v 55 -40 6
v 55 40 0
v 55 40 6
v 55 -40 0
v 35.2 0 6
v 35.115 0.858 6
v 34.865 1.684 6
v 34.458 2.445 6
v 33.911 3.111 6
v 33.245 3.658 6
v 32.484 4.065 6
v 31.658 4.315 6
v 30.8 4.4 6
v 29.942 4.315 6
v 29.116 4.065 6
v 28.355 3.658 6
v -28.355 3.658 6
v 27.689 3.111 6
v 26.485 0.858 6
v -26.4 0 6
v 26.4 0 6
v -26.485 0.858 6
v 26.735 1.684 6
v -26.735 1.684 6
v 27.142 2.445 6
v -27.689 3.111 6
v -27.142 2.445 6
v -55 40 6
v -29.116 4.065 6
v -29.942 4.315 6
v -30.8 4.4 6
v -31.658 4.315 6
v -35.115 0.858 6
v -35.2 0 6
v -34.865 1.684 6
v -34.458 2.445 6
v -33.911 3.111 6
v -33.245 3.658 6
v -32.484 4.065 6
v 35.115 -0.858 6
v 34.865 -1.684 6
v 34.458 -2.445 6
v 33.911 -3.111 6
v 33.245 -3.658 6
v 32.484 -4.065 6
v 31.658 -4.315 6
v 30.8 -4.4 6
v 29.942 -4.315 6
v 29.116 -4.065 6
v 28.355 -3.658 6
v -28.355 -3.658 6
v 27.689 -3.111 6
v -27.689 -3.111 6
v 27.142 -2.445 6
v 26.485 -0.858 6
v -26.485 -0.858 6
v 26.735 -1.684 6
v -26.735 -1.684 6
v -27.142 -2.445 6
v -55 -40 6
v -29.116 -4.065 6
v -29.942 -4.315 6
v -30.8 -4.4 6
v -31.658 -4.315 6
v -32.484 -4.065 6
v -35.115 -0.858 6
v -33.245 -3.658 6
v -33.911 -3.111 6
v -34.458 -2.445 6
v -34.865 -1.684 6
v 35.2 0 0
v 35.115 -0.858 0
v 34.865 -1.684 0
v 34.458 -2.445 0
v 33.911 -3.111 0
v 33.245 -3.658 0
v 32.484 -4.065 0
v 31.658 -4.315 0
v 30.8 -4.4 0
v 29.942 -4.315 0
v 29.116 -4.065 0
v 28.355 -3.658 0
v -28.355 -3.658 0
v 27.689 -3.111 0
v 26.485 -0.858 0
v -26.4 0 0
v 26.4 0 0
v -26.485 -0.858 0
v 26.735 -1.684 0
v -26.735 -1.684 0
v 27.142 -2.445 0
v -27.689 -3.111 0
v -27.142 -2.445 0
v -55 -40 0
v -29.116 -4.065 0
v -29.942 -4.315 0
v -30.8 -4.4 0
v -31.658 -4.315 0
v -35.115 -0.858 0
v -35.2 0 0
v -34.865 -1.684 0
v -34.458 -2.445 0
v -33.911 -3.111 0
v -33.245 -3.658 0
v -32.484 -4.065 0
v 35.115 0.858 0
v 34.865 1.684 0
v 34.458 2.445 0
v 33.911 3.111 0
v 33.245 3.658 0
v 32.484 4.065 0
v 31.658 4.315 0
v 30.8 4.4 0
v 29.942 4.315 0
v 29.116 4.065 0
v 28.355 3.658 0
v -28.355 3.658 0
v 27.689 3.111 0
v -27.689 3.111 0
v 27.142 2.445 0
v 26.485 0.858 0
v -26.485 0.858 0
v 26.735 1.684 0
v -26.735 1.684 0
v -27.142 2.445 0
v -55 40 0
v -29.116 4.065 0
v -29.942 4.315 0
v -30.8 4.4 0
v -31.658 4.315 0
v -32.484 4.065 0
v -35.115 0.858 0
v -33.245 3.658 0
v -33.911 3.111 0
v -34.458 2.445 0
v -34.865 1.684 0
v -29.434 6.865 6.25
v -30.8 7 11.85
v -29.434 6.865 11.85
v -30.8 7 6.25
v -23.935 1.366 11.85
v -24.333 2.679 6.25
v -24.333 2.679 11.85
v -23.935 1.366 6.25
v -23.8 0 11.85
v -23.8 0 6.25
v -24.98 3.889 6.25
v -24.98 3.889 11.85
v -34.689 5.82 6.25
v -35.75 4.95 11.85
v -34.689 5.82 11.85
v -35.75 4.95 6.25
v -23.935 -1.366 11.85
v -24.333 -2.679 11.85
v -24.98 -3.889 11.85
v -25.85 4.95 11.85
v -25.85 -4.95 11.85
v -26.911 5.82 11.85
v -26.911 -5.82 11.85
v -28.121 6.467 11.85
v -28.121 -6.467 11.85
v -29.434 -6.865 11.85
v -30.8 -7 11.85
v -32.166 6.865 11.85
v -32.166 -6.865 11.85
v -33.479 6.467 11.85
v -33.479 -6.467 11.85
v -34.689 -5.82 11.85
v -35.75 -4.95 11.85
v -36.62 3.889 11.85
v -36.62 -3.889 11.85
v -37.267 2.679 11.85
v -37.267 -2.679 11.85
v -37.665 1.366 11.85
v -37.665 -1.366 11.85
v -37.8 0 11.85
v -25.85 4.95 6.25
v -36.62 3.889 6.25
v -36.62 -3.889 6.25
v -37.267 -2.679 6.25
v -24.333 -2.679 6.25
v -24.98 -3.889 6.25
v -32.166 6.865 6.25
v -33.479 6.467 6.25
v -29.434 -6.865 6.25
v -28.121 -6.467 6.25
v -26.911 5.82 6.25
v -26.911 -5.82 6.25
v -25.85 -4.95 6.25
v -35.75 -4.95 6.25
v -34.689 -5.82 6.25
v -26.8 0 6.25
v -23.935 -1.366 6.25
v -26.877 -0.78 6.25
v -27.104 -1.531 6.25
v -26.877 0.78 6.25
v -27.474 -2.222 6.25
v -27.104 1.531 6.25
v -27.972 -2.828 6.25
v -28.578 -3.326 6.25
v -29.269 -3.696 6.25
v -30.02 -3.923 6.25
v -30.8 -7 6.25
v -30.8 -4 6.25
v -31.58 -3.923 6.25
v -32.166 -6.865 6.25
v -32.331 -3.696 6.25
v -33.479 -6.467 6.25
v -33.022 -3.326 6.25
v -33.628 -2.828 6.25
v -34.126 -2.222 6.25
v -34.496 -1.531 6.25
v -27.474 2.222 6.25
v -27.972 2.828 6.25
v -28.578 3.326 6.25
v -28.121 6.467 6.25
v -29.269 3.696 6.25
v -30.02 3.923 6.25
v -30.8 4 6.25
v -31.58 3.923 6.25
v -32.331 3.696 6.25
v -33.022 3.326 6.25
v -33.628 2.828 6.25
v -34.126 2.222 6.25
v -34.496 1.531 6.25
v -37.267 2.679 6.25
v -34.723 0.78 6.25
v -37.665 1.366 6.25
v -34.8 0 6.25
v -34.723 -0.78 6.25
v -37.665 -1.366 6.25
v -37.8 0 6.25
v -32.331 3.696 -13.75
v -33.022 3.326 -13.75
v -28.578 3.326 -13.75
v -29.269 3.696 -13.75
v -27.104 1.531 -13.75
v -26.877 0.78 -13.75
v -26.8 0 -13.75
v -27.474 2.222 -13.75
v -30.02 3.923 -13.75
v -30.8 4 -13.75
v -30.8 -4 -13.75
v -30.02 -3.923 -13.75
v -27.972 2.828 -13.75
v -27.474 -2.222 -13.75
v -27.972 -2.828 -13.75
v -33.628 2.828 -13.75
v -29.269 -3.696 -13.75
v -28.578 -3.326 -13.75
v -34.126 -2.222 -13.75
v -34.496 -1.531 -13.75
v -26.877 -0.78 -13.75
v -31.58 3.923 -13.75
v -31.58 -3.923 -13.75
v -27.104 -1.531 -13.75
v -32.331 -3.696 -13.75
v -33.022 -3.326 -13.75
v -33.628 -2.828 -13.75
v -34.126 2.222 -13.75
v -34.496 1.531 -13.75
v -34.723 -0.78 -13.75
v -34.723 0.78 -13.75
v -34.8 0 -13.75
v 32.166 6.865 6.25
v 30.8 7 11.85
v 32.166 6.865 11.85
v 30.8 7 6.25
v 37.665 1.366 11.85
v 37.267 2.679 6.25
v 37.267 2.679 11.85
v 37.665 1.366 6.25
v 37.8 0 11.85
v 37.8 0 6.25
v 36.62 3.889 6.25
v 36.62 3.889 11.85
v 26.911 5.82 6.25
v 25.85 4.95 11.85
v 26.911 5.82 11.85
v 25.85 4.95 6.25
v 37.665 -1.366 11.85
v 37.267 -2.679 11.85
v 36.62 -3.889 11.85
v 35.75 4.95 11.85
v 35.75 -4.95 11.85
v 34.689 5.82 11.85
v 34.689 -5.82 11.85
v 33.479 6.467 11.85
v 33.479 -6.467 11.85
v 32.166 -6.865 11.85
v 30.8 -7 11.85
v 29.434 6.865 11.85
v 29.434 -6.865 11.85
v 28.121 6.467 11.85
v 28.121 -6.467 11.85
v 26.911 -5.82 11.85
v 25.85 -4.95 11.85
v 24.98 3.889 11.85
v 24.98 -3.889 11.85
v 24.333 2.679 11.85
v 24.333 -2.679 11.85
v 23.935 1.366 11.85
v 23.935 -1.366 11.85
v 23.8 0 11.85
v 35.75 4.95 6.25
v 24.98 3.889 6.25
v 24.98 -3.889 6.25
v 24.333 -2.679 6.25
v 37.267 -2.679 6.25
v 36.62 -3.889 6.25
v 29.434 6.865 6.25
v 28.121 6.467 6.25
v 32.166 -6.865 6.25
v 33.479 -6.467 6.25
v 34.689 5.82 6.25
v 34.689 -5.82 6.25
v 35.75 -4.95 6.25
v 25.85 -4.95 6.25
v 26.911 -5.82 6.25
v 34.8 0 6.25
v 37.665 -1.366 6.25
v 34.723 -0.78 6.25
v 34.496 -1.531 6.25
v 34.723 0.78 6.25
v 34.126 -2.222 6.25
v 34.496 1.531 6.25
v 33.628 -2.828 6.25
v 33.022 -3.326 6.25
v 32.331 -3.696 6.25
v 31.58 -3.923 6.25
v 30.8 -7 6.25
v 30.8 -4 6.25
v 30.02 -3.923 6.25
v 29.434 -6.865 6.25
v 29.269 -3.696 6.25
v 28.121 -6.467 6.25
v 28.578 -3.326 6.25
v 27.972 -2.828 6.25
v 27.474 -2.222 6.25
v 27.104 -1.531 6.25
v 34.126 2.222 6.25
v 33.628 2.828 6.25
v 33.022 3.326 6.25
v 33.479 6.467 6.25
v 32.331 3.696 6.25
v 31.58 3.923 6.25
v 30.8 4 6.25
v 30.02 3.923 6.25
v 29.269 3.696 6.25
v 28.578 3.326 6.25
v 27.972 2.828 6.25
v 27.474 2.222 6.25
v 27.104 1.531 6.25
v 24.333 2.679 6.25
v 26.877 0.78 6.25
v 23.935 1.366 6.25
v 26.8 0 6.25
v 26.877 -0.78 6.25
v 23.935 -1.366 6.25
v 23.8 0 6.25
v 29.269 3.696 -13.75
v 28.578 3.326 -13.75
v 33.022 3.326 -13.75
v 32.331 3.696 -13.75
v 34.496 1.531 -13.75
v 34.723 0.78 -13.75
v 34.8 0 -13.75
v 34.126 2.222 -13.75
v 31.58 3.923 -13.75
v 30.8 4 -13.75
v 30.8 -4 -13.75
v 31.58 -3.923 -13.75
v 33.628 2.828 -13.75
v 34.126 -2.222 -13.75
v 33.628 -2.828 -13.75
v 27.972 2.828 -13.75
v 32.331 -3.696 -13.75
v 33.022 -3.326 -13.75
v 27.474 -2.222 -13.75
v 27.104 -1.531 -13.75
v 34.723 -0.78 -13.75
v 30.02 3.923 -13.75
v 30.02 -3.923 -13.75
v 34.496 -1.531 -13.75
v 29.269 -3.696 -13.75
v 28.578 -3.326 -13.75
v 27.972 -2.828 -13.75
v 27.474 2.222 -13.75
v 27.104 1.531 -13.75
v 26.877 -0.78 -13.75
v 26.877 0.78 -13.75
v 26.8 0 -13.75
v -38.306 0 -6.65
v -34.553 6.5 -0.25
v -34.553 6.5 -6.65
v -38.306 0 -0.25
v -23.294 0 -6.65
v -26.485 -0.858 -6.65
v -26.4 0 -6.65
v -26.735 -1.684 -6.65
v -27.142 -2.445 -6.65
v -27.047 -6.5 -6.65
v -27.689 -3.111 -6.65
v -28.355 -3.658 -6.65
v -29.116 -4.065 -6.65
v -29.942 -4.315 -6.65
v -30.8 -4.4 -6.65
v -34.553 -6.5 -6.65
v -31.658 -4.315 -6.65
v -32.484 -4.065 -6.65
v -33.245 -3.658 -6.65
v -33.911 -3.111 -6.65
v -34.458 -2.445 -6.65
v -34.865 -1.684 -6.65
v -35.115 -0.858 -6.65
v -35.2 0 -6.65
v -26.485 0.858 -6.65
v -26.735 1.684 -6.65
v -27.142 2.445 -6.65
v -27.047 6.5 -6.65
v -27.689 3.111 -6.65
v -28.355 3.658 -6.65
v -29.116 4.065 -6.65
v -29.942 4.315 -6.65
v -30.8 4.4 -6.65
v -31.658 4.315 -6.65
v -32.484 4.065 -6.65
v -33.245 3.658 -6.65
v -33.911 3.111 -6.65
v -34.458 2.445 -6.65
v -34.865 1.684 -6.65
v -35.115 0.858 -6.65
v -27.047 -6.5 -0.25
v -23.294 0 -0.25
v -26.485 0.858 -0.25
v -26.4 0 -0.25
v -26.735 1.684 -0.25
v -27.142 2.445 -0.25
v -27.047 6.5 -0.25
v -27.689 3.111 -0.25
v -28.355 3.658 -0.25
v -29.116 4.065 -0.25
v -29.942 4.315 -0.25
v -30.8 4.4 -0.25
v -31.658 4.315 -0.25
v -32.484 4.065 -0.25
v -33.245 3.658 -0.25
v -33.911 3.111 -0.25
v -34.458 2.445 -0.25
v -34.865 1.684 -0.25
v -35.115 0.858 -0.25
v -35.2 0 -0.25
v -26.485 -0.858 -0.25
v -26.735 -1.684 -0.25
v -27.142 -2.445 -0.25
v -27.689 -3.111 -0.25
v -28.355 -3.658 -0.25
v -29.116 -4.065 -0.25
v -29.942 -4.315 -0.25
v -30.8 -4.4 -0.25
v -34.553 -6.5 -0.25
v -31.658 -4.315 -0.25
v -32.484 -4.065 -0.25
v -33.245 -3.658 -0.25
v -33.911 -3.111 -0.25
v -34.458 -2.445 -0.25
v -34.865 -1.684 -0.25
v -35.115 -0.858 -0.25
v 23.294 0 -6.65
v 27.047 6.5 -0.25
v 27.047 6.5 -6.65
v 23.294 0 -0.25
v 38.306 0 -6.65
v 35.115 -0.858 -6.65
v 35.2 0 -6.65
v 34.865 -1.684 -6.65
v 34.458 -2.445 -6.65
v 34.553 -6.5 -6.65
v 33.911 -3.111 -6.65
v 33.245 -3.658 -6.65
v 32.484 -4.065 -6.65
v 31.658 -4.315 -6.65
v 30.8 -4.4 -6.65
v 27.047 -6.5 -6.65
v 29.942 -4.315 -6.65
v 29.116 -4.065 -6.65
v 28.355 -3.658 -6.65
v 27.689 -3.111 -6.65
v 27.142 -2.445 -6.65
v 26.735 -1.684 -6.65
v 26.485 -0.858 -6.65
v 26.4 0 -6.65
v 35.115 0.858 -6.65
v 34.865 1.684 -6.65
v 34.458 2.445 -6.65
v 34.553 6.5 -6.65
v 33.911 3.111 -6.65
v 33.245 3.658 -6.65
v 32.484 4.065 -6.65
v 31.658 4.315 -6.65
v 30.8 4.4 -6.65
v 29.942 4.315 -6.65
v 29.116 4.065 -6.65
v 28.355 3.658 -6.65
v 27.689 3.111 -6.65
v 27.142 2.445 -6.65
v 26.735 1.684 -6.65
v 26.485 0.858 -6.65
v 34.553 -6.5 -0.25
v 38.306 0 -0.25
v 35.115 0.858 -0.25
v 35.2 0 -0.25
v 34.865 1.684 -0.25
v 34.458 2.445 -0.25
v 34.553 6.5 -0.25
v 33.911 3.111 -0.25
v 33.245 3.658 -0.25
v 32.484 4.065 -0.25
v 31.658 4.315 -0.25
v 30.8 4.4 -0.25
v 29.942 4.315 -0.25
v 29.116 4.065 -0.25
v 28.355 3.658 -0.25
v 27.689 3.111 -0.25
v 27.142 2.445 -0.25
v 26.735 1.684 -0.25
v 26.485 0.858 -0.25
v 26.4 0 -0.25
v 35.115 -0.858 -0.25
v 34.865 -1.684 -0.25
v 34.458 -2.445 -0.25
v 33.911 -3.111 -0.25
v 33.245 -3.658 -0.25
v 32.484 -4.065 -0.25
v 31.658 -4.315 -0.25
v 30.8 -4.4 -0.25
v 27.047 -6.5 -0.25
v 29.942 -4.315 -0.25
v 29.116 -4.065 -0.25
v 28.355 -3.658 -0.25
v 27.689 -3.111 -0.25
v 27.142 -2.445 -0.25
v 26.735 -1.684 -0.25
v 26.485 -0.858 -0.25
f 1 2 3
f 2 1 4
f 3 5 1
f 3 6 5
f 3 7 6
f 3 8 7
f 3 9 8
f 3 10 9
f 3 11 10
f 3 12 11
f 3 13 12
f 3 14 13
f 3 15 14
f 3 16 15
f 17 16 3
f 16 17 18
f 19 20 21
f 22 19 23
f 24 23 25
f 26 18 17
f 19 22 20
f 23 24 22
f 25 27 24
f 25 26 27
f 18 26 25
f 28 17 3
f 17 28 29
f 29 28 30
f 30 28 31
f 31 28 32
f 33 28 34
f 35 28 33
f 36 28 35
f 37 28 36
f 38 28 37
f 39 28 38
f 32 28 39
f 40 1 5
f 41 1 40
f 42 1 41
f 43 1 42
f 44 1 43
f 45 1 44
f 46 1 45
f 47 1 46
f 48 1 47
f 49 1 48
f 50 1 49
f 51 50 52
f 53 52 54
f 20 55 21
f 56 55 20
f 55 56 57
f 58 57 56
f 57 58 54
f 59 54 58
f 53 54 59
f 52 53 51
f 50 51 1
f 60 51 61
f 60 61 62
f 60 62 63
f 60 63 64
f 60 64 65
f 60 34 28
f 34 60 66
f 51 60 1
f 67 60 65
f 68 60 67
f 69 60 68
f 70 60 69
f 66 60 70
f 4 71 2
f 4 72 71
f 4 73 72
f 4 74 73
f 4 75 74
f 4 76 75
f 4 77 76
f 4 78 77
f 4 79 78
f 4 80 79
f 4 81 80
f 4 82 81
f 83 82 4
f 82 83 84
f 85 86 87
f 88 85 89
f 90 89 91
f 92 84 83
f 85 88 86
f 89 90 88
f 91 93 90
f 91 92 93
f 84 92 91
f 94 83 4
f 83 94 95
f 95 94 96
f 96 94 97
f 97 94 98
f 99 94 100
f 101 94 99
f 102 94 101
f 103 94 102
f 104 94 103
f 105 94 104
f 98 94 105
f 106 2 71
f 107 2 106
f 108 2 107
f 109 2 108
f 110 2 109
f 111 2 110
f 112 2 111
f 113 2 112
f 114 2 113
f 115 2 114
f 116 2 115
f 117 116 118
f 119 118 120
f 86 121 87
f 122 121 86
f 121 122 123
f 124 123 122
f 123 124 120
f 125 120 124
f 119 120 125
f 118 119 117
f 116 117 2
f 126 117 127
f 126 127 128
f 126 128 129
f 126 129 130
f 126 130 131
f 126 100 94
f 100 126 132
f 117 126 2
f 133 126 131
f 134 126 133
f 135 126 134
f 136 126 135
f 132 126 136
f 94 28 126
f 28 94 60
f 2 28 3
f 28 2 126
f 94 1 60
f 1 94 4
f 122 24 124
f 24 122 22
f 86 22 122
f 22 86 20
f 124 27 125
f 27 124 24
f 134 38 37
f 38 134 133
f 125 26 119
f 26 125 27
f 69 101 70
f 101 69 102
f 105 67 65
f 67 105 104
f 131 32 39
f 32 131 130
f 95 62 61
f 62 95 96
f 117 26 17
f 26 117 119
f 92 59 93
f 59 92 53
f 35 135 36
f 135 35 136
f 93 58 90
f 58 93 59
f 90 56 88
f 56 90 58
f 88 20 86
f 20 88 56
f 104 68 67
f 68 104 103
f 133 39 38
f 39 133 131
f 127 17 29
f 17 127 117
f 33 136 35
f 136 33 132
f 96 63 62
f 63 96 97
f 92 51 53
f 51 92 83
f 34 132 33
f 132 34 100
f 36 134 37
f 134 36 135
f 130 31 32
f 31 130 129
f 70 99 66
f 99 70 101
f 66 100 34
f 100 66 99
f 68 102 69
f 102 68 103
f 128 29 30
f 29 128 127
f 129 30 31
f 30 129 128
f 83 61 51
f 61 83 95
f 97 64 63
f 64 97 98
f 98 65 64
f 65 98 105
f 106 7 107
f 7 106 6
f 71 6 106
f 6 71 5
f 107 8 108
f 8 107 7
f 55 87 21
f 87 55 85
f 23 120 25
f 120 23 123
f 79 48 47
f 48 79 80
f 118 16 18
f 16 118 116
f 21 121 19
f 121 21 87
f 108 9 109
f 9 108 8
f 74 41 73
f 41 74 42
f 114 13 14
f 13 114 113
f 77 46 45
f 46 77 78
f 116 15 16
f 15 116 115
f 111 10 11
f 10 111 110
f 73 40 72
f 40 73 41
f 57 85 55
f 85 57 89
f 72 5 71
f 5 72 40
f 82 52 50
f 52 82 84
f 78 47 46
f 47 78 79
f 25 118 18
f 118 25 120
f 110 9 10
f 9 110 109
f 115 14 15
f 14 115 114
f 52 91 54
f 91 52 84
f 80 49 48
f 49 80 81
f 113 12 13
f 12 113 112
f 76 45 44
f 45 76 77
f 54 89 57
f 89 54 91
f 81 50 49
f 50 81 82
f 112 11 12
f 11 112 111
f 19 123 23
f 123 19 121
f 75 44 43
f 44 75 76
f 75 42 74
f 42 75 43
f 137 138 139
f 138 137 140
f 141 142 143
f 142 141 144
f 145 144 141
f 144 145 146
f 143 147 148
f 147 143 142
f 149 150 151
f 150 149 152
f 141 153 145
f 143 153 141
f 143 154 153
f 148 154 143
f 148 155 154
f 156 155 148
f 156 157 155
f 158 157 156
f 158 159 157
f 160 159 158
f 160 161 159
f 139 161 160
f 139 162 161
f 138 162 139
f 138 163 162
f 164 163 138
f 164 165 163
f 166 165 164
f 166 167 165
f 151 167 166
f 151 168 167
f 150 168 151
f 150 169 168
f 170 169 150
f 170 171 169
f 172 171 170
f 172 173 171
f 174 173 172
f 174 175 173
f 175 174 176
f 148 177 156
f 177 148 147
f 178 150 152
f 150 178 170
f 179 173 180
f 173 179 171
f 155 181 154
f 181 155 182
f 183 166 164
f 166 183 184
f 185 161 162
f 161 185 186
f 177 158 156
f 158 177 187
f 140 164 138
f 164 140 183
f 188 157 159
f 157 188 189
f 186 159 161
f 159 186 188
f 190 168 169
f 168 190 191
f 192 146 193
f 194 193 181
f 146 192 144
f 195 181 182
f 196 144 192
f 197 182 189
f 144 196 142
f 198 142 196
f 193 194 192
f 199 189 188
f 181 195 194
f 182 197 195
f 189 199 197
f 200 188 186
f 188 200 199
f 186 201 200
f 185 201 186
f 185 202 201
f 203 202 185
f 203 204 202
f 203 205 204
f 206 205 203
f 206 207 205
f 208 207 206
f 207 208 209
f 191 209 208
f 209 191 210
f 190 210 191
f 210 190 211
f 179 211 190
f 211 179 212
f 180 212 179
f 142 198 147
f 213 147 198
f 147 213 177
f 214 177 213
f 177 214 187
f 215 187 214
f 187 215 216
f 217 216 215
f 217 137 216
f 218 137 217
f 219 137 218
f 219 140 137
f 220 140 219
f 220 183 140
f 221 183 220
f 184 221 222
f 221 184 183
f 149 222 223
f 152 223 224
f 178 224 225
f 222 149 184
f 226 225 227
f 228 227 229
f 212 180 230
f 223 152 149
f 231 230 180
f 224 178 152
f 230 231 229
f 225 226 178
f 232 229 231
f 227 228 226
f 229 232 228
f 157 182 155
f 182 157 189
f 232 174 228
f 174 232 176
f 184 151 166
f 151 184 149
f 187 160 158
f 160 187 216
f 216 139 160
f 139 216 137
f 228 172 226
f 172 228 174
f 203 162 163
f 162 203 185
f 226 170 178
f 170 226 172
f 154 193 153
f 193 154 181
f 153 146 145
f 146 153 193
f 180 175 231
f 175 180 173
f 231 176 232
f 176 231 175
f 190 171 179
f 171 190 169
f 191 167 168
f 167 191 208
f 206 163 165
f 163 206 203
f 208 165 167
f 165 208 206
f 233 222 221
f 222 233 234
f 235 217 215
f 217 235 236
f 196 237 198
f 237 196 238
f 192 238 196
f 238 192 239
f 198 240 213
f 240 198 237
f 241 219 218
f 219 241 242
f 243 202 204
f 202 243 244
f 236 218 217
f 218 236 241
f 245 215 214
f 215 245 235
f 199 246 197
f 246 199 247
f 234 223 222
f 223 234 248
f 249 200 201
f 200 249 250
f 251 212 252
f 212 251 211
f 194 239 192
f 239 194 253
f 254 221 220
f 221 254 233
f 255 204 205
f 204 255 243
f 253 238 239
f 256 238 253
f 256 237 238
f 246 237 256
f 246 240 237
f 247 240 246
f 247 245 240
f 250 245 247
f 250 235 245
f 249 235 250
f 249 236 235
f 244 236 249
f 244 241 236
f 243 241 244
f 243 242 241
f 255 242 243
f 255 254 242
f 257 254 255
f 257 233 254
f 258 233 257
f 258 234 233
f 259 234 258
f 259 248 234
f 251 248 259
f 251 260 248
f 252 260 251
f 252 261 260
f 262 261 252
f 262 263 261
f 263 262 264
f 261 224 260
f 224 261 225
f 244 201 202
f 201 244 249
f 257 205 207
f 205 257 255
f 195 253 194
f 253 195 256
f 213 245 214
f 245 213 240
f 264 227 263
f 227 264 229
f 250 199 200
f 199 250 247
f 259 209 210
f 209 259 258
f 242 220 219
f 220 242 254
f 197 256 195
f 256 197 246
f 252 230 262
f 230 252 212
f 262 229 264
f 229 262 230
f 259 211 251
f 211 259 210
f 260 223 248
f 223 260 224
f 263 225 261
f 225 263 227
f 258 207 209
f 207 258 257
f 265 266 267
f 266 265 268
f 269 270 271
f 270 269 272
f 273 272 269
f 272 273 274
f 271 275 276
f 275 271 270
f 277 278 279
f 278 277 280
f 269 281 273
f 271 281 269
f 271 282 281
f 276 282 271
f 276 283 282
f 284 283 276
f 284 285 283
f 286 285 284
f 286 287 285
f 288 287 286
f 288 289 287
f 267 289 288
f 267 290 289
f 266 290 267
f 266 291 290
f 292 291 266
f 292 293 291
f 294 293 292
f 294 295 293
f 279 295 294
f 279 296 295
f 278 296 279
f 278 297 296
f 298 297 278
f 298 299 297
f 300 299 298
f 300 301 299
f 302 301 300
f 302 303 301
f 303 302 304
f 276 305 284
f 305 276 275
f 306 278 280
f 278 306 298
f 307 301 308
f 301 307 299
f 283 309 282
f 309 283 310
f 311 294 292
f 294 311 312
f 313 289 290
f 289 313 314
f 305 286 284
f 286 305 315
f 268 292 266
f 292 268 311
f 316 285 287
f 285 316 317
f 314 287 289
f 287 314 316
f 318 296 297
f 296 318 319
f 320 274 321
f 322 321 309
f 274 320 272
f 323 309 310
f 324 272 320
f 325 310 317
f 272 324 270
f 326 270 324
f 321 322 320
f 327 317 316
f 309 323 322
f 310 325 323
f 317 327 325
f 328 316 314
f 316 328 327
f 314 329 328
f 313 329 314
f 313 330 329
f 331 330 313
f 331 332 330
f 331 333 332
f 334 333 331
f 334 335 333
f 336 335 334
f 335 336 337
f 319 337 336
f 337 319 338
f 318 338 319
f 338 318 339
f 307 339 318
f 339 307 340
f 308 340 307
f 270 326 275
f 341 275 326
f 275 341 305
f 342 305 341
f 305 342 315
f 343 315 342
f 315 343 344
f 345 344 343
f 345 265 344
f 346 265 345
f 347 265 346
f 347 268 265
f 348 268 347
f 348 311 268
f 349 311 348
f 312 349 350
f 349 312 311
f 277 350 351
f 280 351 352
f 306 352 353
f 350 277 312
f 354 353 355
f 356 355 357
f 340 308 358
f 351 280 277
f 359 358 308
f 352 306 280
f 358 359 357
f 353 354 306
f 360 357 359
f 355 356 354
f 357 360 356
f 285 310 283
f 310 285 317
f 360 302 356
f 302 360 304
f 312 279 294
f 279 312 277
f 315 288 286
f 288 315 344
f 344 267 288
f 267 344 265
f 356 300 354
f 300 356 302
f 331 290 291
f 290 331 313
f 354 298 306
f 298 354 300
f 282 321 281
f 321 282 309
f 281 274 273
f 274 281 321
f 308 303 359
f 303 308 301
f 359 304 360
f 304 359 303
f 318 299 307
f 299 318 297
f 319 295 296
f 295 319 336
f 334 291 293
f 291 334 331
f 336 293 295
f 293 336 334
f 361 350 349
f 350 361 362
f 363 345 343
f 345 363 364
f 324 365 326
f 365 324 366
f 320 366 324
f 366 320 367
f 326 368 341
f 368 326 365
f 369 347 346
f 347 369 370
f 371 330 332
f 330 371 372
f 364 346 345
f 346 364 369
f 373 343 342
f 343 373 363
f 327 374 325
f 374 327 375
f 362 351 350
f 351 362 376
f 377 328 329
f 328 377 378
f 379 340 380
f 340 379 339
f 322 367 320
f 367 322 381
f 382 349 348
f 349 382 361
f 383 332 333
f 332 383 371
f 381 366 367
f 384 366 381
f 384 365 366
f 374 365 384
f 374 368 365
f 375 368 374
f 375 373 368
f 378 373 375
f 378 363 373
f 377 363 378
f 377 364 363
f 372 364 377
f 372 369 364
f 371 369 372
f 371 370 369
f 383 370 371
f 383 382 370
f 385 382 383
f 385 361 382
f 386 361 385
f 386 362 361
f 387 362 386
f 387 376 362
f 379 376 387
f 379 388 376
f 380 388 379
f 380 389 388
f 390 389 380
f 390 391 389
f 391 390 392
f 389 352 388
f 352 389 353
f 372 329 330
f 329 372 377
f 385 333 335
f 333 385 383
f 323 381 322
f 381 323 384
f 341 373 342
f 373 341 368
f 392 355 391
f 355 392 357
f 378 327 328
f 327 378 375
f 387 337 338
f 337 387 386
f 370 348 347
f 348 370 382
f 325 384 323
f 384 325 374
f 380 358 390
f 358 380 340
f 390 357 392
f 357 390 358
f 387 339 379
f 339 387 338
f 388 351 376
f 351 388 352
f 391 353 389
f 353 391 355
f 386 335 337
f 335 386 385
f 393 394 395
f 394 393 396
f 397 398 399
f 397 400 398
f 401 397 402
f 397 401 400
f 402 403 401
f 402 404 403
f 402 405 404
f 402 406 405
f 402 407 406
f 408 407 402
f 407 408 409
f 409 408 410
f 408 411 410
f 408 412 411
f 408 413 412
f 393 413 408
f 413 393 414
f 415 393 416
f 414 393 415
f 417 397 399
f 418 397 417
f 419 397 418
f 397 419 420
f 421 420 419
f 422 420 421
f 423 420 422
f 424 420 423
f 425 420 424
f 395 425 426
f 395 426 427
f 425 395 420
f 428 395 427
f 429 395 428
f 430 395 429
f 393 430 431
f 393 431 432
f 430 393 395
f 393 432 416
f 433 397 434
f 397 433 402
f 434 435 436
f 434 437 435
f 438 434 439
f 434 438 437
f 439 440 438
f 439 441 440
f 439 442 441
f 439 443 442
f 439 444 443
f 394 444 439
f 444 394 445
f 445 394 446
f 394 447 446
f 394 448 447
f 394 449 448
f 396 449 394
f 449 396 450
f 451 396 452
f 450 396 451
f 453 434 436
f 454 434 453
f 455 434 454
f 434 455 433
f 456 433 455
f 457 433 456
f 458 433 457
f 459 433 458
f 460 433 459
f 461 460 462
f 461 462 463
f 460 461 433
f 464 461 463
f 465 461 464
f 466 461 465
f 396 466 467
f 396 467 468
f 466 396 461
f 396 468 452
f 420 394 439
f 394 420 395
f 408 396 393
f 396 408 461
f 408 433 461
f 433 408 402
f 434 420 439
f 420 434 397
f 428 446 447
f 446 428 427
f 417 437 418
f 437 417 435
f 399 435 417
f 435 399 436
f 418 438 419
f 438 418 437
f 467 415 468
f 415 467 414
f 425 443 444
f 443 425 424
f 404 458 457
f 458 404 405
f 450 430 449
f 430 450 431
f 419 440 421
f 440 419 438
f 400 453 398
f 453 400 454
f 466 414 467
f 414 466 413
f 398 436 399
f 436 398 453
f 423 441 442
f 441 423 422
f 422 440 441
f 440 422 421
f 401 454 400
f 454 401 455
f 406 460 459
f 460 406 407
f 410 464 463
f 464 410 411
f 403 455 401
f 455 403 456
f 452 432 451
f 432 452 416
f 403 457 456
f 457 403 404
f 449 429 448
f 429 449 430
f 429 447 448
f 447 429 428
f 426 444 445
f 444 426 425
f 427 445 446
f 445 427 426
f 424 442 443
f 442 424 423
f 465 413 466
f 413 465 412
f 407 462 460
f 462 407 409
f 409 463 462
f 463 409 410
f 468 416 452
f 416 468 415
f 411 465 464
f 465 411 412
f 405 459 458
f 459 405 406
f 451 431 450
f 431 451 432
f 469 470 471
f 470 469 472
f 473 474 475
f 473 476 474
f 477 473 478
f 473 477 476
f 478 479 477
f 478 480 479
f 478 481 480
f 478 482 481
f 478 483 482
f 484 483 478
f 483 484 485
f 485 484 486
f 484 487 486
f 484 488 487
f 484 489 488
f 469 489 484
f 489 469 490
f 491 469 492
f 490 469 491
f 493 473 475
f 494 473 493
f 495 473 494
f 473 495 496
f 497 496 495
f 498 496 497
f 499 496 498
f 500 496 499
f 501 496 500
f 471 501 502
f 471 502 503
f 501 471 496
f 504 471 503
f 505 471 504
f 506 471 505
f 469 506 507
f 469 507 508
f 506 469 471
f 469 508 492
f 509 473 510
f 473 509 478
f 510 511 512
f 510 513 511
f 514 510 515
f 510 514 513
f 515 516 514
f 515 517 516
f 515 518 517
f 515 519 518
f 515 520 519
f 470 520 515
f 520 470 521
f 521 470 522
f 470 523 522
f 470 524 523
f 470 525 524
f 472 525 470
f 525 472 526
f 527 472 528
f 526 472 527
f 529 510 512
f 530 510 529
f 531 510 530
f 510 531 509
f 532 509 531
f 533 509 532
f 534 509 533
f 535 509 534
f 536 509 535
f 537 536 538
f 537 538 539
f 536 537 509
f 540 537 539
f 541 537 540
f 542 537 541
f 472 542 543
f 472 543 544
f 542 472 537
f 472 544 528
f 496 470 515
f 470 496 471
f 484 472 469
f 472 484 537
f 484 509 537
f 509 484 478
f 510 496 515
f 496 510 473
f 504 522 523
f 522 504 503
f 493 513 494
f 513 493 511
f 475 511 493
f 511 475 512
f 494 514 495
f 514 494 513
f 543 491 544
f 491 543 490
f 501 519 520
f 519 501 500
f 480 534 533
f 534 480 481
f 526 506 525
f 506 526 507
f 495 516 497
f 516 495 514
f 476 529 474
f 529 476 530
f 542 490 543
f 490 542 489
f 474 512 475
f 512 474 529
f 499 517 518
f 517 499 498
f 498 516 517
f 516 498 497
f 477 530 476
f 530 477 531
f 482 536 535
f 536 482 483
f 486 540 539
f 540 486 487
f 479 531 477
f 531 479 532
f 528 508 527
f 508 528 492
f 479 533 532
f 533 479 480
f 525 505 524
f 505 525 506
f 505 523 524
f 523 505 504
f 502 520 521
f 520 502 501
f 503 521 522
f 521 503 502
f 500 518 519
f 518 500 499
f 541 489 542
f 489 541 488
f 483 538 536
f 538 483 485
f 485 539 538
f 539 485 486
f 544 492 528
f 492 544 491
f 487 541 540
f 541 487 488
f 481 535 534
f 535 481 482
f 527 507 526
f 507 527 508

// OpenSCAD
$fn = 32;

// ------------------------------------------------------------------------
// Bolted plate: 110 x 80 x 6 mm plate, 2 fasteners
// Every part is its own module, assembly() places them once.
// ------------------------------------------------------------------------

// --- part 1 ---
module plate() {
  difference() {
    translate([-55, -40, 0]) cube([110, 80, 6]);
    translate([-30.8, 0, -1]) cylinder(h = 8, d = 8.8);
    translate([30.8, 0, -1]) cylinder(h = 8, d = 8.8);
  }
}

// --- part 2 ---
module bolt1() {
  cylinder(h = 5.6, d = 14);
  translate([0, 0, -20]) cylinder(h = 20, d = 8);
}

// --- part 3 ---
module bolt2() {
  cylinder(h = 5.6, d = 14);
  translate([0, 0, -20]) cylinder(h = 20, d = 8);
}

// --- part 4 ---
module nut1() {
  difference() {
    linear_extrude(height = 6.4) polygon(points = [[7.506, 0], [3.753, 6.5], [-3.753, 6.5], [-7.506, 0], [-3.753, -6.5], [3.753, -6.5]]);
    translate([0, 0, -1]) cylinder(h = 8.4, d = 8.8);
  }
}

// --- part 5 ---
module nut2() {
  difference() {
    linear_extrude(height = 6.4) polygon(points = [[7.506, 0], [3.753, 6.5], [-3.753, 6.5], [-7.506, 0], [-3.753, -6.5], [3.753, -6.5]]);
    translate([0, 0, -1]) cylinder(h = 8.4, d = 8.8);
  }
}

// --- assembly ---
module assembly() {
  translate([0, 0, 0]) rotate([0, 0, 0]) plate();
  translate([-30.8, 0, 6.25]) rotate([0, 0, 0]) bolt1();
  translate([30.8, 0, 6.25]) rotate([0, 0, 0]) bolt2();
  translate([-30.8, 0, -6.65]) rotate([0, 0, 0]) nut1();
  translate([30.8, 0, -6.65]) rotate([0, 0, 0]) nut2();
}

assembly();
